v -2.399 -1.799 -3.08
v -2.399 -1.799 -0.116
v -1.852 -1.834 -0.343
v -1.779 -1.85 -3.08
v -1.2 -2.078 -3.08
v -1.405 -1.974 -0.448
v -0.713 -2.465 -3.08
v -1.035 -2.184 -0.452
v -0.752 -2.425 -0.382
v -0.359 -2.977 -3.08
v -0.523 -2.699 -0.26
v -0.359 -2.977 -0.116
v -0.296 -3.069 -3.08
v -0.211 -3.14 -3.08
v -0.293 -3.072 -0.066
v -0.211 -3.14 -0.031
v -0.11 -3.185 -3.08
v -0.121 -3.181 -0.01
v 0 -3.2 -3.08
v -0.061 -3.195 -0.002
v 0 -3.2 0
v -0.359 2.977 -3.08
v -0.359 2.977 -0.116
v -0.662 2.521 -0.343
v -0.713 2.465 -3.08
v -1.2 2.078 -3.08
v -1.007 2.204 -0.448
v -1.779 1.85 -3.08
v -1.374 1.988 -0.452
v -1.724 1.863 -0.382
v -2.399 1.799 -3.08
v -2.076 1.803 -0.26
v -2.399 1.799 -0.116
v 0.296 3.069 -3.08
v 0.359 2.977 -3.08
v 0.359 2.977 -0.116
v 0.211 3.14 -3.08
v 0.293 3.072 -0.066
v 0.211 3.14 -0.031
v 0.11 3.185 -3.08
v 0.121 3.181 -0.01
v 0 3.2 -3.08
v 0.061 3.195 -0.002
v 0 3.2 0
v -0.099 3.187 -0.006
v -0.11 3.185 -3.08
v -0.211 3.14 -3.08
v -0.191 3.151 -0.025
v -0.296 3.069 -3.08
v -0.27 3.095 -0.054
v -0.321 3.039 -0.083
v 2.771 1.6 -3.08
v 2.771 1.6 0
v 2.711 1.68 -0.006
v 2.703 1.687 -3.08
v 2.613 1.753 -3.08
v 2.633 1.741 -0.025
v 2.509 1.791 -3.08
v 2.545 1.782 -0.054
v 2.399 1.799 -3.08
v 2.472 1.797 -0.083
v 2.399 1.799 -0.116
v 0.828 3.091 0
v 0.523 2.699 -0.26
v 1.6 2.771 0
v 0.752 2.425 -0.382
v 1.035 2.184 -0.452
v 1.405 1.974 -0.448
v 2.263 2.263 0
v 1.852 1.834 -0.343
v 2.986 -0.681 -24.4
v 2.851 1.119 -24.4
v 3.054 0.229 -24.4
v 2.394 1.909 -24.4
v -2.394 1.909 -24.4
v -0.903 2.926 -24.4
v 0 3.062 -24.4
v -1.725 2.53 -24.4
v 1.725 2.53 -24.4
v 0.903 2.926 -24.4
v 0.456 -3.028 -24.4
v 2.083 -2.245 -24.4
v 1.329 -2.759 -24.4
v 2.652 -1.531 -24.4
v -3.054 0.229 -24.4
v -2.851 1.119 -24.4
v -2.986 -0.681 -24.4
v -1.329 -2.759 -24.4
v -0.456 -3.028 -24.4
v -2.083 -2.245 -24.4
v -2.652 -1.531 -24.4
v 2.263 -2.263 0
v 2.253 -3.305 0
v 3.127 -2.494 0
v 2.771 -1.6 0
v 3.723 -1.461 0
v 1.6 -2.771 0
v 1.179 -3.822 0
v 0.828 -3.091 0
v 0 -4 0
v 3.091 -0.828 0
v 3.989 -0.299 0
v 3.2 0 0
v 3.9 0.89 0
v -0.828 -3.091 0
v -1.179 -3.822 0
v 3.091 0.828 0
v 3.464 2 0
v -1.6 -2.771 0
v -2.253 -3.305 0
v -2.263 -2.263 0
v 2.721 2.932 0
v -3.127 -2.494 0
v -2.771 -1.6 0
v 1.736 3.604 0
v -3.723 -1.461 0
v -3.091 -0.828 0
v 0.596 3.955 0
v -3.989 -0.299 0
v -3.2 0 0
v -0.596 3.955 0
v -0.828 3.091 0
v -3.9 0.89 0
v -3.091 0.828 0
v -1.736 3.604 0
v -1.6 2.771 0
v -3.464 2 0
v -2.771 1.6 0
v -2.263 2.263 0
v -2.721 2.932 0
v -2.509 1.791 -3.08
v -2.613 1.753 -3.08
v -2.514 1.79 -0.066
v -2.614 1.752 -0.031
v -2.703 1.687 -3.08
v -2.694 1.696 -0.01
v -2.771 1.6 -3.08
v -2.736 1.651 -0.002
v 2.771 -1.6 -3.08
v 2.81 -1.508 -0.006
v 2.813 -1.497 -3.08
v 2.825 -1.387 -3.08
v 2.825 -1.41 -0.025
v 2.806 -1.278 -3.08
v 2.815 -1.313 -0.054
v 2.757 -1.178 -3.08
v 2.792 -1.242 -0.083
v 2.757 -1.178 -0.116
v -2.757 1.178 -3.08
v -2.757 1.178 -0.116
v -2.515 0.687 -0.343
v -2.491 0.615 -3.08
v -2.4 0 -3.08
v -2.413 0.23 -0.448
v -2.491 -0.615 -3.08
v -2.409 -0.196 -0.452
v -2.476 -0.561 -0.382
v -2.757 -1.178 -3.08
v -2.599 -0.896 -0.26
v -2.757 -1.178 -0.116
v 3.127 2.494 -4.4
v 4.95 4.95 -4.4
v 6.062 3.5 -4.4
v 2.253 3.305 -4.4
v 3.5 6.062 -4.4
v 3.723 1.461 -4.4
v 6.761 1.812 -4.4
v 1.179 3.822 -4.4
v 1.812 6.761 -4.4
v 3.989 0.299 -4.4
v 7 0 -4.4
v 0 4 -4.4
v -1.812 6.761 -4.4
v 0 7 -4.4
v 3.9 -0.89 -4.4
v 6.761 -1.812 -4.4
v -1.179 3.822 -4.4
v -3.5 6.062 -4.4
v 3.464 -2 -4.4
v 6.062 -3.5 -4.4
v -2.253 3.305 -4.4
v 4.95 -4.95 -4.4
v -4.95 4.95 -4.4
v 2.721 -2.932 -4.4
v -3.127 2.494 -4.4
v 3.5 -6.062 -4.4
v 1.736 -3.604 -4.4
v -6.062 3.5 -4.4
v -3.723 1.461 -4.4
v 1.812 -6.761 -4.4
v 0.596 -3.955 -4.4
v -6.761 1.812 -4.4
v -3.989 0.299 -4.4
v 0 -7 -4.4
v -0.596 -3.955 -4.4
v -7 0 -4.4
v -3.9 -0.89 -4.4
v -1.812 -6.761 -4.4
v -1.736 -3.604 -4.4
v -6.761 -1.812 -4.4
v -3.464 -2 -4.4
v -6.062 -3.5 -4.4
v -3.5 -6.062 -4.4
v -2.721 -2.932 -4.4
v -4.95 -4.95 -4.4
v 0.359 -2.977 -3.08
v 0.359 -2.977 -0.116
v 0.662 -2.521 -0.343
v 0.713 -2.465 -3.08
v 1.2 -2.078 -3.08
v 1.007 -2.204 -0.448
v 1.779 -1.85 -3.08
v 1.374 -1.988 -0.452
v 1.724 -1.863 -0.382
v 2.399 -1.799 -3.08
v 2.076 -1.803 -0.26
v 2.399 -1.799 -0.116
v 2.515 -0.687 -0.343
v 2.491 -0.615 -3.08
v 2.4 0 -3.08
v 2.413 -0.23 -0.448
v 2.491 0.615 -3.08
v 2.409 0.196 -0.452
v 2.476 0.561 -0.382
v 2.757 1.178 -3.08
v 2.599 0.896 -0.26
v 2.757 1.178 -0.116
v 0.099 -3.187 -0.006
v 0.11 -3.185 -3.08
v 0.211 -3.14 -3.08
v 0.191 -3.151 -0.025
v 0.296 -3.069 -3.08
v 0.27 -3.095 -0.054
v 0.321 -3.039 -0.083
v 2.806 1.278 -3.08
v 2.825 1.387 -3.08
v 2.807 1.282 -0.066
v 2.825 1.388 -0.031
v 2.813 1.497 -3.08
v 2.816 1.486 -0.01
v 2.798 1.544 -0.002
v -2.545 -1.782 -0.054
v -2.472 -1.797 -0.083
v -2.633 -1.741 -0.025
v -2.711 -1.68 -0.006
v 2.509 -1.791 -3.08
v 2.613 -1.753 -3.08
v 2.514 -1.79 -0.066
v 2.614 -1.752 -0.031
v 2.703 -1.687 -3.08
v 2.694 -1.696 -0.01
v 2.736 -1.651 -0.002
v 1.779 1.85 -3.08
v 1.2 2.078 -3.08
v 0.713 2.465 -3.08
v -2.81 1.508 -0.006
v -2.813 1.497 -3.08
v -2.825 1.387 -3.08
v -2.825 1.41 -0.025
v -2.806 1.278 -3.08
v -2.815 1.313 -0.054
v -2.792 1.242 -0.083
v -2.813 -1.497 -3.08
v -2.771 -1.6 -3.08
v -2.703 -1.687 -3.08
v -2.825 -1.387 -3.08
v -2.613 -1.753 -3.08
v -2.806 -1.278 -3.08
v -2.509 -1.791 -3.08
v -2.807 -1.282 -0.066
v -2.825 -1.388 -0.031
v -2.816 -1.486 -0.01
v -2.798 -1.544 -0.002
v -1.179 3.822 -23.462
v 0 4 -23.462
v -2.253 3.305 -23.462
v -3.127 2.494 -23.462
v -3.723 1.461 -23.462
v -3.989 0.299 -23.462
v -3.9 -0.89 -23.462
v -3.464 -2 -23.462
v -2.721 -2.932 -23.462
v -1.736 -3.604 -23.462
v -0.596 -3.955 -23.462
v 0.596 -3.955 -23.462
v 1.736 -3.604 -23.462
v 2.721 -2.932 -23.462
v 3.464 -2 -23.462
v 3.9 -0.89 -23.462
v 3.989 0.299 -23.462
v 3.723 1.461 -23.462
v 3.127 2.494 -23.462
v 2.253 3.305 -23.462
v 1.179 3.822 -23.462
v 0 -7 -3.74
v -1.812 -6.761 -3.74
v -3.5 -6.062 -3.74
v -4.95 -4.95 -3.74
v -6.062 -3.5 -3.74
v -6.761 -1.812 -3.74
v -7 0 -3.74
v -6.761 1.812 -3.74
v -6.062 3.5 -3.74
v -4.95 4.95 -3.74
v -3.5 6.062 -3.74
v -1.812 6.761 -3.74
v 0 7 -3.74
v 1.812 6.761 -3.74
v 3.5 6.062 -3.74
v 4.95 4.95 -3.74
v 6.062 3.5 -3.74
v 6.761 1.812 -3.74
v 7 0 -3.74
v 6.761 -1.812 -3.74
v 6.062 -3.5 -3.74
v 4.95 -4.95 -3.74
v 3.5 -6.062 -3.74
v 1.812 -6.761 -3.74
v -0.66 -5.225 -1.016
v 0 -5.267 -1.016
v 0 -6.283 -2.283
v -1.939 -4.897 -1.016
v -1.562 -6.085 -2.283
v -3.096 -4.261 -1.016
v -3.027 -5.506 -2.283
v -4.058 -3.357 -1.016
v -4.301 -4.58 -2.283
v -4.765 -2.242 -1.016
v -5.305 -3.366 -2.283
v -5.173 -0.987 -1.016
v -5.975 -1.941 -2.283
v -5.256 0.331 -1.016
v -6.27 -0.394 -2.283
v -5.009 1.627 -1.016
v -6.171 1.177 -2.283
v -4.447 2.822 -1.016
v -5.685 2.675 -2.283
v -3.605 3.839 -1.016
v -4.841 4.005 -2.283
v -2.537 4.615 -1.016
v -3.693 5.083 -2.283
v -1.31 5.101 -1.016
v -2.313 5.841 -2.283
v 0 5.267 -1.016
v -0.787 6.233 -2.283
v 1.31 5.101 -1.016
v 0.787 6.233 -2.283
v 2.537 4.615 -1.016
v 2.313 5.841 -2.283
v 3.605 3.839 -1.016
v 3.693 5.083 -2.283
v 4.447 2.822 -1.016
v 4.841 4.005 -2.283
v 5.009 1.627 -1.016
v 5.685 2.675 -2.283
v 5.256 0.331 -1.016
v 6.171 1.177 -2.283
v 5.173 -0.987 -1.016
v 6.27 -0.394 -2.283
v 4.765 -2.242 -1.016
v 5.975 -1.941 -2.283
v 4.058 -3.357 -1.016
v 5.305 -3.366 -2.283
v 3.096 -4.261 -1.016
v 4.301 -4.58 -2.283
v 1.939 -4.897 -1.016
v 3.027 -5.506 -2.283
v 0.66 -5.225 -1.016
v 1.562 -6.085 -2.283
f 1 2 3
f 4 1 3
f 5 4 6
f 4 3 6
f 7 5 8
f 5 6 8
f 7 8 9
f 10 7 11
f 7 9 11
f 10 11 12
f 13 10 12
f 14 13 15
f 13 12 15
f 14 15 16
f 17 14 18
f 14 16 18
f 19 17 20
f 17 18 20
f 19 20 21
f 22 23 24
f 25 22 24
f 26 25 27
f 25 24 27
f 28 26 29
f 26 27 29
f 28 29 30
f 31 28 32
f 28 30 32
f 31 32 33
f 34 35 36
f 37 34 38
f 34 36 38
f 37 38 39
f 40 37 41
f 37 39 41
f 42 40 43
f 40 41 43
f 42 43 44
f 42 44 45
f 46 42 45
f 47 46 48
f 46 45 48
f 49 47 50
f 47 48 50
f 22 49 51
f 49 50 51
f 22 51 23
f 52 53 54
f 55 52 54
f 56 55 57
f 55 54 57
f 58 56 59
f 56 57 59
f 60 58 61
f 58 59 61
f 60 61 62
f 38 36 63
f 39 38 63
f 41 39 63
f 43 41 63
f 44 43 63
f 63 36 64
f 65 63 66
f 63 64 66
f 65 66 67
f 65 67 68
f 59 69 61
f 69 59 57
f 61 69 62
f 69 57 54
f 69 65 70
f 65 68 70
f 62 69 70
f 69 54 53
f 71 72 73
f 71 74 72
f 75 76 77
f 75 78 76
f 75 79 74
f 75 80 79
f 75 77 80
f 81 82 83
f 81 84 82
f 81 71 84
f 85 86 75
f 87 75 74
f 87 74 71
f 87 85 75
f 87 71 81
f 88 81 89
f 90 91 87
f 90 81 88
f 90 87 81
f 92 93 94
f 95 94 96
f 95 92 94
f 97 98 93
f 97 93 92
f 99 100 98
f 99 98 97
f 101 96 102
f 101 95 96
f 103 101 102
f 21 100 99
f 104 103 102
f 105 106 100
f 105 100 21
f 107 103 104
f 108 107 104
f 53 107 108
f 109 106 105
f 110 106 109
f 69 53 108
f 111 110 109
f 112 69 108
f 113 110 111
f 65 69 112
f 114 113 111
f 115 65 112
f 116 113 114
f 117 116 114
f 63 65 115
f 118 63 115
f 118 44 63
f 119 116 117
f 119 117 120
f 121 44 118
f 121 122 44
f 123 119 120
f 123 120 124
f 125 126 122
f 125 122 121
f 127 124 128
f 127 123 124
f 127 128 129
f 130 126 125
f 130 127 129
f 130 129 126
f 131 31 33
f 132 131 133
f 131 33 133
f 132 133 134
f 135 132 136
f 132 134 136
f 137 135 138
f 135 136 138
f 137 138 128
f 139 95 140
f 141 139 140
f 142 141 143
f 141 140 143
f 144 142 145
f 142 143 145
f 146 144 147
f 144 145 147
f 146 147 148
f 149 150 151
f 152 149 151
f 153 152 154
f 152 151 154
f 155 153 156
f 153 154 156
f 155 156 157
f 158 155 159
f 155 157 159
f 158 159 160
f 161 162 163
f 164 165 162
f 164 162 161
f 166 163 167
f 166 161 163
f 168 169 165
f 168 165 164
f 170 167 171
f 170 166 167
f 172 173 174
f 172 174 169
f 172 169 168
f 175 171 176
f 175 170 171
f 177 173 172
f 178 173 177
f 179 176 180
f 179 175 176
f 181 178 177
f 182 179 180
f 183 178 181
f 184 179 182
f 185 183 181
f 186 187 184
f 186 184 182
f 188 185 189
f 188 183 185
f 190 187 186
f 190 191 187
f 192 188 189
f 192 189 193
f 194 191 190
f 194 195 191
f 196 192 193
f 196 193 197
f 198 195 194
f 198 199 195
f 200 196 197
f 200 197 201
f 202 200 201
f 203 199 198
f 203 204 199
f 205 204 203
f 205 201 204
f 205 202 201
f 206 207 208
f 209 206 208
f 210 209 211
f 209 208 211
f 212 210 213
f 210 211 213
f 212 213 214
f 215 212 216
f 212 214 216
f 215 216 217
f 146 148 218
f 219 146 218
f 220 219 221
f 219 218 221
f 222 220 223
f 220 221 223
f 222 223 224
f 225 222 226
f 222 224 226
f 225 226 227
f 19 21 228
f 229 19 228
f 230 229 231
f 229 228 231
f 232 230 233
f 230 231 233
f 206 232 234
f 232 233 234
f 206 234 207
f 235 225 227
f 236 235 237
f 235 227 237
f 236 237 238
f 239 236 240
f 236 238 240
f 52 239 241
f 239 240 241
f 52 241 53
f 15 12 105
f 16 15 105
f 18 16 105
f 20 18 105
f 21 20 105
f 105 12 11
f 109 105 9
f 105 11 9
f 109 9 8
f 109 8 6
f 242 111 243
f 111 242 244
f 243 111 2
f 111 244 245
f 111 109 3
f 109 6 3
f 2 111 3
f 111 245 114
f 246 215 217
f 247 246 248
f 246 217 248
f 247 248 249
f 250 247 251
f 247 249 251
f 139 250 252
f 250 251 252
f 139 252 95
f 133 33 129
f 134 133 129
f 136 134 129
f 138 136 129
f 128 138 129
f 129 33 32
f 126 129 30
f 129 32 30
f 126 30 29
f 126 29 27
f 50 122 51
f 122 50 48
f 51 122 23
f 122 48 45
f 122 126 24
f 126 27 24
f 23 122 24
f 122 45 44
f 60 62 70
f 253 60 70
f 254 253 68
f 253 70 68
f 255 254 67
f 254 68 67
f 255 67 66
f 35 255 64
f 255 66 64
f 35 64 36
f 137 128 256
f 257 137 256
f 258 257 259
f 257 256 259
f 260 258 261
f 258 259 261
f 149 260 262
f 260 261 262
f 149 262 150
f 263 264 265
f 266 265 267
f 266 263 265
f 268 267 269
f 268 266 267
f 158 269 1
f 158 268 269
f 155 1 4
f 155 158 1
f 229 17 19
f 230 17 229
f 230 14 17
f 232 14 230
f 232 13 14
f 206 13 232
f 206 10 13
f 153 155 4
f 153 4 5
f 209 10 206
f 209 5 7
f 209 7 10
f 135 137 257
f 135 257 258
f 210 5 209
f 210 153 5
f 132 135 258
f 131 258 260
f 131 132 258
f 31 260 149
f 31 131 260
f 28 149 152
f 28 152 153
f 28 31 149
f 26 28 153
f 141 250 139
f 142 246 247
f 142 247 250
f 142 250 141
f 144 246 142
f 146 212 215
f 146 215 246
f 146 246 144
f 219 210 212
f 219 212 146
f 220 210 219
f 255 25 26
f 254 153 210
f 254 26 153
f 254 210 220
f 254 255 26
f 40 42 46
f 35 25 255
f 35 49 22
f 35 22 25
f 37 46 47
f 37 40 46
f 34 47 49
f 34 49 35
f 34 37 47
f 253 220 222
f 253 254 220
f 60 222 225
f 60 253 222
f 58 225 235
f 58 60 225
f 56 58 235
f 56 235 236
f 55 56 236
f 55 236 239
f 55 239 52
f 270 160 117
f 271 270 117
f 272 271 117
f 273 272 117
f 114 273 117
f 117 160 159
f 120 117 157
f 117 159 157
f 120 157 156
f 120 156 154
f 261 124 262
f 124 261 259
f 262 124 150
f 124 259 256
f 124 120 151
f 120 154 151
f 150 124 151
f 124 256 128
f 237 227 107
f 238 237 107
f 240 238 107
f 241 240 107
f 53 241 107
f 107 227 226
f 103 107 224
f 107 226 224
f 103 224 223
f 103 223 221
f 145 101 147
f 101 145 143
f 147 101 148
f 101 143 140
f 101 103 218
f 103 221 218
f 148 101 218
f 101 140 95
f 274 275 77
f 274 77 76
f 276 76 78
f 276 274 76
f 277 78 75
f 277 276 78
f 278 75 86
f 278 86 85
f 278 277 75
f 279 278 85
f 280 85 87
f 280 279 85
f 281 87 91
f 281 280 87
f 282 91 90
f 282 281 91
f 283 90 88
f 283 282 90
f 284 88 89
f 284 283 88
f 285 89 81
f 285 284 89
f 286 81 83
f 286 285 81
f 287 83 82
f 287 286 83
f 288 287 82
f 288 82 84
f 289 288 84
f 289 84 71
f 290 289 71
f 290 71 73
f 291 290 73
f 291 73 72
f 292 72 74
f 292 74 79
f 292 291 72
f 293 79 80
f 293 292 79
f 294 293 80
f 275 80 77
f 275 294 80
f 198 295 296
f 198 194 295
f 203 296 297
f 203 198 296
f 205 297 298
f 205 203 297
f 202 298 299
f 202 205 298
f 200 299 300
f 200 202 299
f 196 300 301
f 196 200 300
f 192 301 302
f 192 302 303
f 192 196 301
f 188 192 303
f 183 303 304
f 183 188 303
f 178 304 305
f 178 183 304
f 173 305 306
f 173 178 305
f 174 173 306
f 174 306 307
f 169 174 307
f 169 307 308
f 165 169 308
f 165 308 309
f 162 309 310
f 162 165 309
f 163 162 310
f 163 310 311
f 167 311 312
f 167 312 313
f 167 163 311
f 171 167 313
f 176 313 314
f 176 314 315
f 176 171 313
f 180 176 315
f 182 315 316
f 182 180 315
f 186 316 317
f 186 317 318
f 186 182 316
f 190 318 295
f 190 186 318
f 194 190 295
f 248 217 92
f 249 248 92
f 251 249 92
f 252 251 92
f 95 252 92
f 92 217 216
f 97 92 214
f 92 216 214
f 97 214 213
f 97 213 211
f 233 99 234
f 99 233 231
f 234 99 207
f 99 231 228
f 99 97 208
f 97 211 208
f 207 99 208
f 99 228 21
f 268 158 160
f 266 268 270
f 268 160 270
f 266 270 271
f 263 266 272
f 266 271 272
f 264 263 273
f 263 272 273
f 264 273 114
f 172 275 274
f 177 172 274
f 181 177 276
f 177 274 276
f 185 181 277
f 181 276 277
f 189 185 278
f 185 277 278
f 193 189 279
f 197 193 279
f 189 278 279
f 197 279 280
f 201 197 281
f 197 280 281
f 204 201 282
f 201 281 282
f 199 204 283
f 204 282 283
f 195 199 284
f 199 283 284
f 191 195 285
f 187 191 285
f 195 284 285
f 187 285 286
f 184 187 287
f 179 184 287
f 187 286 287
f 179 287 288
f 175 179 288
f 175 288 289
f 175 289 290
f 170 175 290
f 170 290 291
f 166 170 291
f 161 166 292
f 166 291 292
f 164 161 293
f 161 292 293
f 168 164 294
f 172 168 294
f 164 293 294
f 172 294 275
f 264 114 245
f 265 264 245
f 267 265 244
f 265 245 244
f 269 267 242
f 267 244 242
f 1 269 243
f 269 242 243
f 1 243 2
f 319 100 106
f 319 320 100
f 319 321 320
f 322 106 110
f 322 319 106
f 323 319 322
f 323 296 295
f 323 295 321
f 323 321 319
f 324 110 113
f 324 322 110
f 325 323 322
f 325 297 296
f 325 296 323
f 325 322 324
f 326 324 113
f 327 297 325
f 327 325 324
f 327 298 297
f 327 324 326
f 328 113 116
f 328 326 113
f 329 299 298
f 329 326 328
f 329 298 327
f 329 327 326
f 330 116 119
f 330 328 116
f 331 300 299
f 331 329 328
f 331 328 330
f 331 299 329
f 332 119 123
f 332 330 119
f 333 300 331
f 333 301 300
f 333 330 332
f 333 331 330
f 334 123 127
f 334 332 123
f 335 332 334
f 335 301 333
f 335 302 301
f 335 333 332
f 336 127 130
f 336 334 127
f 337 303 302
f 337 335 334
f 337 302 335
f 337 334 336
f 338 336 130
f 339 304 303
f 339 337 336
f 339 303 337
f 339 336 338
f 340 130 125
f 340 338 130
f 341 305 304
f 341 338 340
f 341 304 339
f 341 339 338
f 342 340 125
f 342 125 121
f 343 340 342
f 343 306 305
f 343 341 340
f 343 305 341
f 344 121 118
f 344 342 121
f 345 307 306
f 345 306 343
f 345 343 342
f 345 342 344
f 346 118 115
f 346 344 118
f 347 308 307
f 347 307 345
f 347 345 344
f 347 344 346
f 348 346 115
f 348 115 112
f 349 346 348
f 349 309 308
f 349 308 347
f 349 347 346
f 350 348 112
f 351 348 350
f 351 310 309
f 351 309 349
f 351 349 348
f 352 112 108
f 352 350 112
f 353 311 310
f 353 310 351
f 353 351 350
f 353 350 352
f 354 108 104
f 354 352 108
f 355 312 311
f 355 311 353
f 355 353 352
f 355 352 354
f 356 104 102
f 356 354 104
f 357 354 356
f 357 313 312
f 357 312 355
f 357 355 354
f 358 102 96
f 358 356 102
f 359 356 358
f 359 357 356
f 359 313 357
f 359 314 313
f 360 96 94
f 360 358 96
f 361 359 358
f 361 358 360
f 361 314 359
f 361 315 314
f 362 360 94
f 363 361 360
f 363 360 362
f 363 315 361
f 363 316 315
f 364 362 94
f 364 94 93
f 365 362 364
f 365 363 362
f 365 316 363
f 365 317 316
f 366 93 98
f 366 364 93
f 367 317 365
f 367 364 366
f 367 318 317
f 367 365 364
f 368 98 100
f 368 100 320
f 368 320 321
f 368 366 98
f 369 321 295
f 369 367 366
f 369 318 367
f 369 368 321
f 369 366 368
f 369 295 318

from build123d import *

# Parameters (mm, degrees)
SKETCH1_W          = 20
SKETCH1_H          = 4
CHAMFER1_SIZE      = 0.9375
CUT_EXTRUDE4_DEPTH = 3.08
CIRPATTERN1_COUNT  = 6


with BuildPart() as part:
    # Sketch1 → Revolve1 (revolve)
    with BuildSketch(Plane(origin=(0, 0, 0), x_dir=(0, 0, -1), z_dir=(1, 0, 0))):
        with Locations((14.4, 2)):
            Rectangle(SKETCH1_W, SKETCH1_H)
    revolve(axis=Axis((0, 0, -24.4), (0, 0, 1)))

    # Chamfer1
    chamfer1_edges = [part.edges().sort_by_distance(p)[0] for p in [
        (0, -4, -24.4),
    ]]
    chamfer(chamfer1_edges, length=CHAMFER1_SIZE)

    # Sketch7 → Revolve2 (revolve)
    with BuildSketch(Plane(origin=(0, 0, 0), x_dir=(0, 0, -1), z_dir=(1, 0, 0))):
        with BuildLine():
            Line((3.74, 7), (4.4, 7))
            Line((4.4, 7), (4.4, 0))
            Line((4.4, 0), (0, 0))
            Line((0, 0), (0, 4))
            ThreePointArc((0, 4), (1.621972026, 5.809208208), (3.74, 7))
        make_face()
    revolve(axis=Axis((0, 0, 0), (0, 0, -1)))

    # Sketch11 → Cut-Extrude4 (cut)
    with BuildSketch(Plane.XY):
        with BuildLine():
            Line((0, 0), (-2.771281292, 1.6))
            ThreePointArc((-2.771281292, 1.6), (-2.824655372, 1.386863789), (-2.75740496, 1.177691088))
            ThreePointArc((-2.75740496, 1.177691088), (-2.4, 0), (-2.75740496, -1.177691088))
            ThreePointArc((-2.75740496, -1.177691088), (-2.824655372, -1.386863789), (-2.771281292, -1.6))
            Line((-2.771281292, -1.6), (0, 0))
        make_face()
    cut_extrude4 = extrude(amount=-CUT_EXTRUDE4_DEPTH, mode=Mode.SUBTRACT)

    # CirPattern1: Cut-Extrude4 ×6 about axis
    cirpattern1_axis = Axis((0, 0, 0), (0, 0, -1))
    for i in range(1, CIRPATTERN1_COUNT):
        add(cut_extrude4.rotate(cirpattern1_axis, i * 360 / CIRPATTERN1_COUNT), mode=Mode.SUBTRACT)

    # Cut-Extrude3 cone 1 section (through the dimple's axis) → Cut-Extrude3 (revolve, cut)
    with BuildSketch(Plane(origin=(0, 0, 0), x_dir=(0, -1, 0), z_dir=(1, 0, 0))):
        Polygon((0, 0), (3.2, 0), (0, 1.847520861), align=None)
    revolve(axis=Axis((0, 0, 0), (0, 0, -1)), mode=Mode.SUBTRACT)


solid = part.part
